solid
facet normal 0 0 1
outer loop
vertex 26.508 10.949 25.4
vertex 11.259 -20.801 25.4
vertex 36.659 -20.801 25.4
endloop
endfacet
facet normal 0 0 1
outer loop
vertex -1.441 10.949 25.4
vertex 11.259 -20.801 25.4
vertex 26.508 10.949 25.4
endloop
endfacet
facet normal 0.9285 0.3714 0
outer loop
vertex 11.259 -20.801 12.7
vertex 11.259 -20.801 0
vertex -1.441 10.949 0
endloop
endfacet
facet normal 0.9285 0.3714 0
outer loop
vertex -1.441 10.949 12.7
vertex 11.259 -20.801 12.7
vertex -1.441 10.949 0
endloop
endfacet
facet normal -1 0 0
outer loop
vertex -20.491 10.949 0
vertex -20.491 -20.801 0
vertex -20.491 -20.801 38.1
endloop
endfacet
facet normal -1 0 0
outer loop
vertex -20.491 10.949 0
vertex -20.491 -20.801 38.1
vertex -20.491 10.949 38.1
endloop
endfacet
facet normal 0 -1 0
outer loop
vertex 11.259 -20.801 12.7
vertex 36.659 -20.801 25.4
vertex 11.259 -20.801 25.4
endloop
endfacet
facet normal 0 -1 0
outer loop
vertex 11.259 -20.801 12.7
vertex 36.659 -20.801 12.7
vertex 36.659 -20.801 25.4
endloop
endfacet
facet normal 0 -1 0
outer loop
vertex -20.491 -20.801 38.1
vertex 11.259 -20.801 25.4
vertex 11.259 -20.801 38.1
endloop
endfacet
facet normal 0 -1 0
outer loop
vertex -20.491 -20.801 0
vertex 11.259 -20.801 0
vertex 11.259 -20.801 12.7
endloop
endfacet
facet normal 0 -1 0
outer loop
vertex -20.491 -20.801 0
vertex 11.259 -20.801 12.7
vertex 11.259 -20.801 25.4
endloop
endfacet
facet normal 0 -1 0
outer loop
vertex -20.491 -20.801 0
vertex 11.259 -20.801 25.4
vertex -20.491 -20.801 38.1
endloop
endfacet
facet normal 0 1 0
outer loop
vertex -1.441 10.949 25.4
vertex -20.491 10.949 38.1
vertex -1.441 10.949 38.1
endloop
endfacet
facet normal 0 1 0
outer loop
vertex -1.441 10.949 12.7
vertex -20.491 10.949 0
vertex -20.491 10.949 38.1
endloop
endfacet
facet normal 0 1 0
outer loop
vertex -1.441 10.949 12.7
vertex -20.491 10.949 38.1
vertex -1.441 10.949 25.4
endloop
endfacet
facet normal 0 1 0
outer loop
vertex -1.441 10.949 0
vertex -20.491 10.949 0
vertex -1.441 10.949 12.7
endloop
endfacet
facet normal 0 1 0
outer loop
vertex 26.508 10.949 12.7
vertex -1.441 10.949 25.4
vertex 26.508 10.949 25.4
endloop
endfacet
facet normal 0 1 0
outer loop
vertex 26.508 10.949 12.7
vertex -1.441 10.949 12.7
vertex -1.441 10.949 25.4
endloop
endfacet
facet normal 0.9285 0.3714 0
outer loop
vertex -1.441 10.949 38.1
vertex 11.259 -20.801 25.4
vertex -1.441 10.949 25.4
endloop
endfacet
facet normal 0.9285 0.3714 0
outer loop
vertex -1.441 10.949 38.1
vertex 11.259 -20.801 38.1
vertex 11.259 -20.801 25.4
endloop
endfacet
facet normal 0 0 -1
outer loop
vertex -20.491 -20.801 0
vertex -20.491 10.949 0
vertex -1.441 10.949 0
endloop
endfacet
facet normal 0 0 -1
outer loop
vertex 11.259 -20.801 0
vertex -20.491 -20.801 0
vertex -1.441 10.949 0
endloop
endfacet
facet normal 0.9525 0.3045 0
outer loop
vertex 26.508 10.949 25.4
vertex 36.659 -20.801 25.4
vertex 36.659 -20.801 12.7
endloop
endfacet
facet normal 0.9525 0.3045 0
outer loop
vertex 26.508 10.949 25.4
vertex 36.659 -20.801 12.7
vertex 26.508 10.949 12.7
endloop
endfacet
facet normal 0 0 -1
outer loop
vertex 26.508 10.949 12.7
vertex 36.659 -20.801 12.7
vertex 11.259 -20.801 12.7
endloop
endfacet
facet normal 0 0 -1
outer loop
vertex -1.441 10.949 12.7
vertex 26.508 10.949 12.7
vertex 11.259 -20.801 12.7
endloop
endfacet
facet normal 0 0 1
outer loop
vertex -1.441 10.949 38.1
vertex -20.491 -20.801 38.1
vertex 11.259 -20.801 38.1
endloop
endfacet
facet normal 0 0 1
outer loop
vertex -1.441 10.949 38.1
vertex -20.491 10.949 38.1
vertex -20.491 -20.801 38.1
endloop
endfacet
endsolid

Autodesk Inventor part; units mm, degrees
ref_plane "YZ Plane" through (0, 0, 0) normal (1, 0, 0) x (0, 1, 0)
ref_plane "XZ Plane" through (0, 0, 0) normal (0, 1, 0) x (-1, 0, 0)
ref_plane "XY Plane" through (0, 0, 0) normal (0, 0, 1) x (1, 0, 0)
sketch "Sketch1" plane through (0, 0, 0) normal (0, 0, 1) x (1, 0, 0)
  line L0 (-20.4911, 10.9492) -> (11.2589, 10.9492)
  line L1 (11.2589, 10.9492) -> (11.2589, -20.8008)
  line L2 (11.2589, -20.8008) -> (-20.4911, -20.8008)
  line L3 (-20.4911, -20.8008) -> (-20.4911, 10.9492)
  point P0 (0, 0)
  dimension "d0" = 31.75
  dimension "d1" = 31.75
extrude "Extrusion1" add sketch "Sketch1" along normal blind 38.1
sketch "Sketch2" plane through (0, 0, 38.1) normal (0, 0, 1) x (1, 0, 0)
  line L0 (-20.4911, -20.8008) -> (11.2589, -20.8008) projected
  line L1 (11.2589, -20.8008) -> (-1.4411, 10.9492)
  line L2 (11.2589, 10.9492) -> (-20.4911, 10.9492) projected
  line L3 (-1.4411, 10.9492) -> (11.2589, 10.9492)
  line L4 (11.2589, -20.8008) -> (11.2589, 10.9492) projected
  line L5 (11.2589, 10.9492) -> (11.2589, -20.8008)
  point P0 (0, 0)
  dimension "d4" = 19.05
sketch "Sketch3" plane through (11.2589, -20.8008, 0) normal (1, 0, 0) x (0, 0, -1)
  line L0 (0, 31.75) -> (-38.1, 31.75) projected
  line L1 (0, 0) -> (-38.1, 0) projected
  line L2 (-25.4, 31.75) -> (-12.7, 31.75)
  line L3 (-12.7, 31.75) -> (-12.7, 0)
  line L4 (-12.7, 0) -> (-25.4, 0)
  line L5 (-25.4, 0) -> (-25.4, 31.75)
  line L6 (0, 31.75) -> (0, 0) projected
  line L7 (-38.1, 0) -> (-38.1, 31.75) projected
  point P0 (0, 20.8008)
  dimension "d5" = 12.7
  dimension "d6" = 12.7
extrude "Extrusion2" add sketch "Sketch3" along normal blind 25.4 contours L3 L1 L5 L0
sketch "Sketch4" plane through (11.2589, -20.8008, 25.4) normal (0, 0, 1) x (1, 0, 0)
  line L0 (0, 0) -> (25.4, 0) projected
  line L1 (25.4, 0) -> (15.2492, 31.75)
  line L2 (0, 31.75) -> (25.4, 31.75) projected
  line L3 (15.2492, 31.75) -> (25.4, 31.75)
  line L4 (25.4, 31.75) -> (25.4, 0) projected
  line L5 (25.4, 31.75) -> (25.4, 0)
  point P0 (-11.2589, 20.8008)
extrude "Extrusion3" cut sketch "Sketch4" against normal blind 25.4
extrude "Extrusion4" cut sketch "Sketch2" against normal blind 12.7
sketch "Sketch5" plane through (0, 0, 0) normal (0, 0, -1) x (-1, 0, 0)
  line L0 (-11.2589, 10.9492) -> (-11.2589, -20.8008) projected
  line L1 (-11.2589, -20.8008) -> (1.4411, 10.9492) projected
  line L2 (-11.2589, -20.8008) -> (1.4411, 10.9492)
  line L3 (20.4911, 10.9492) -> (-11.2589, 10.9492) projected
  line L4 (1.4411, 10.9492) -> (-11.2589, 10.9492)
  line L5 (-11.2589, 10.9492) -> (-11.2589, -20.8008)
  point P0 (0, 0)
extrude "Extrusion5" cut sketch "Sketch5" against normal blind 12.7
properties part number "Figure 7_28_1"
